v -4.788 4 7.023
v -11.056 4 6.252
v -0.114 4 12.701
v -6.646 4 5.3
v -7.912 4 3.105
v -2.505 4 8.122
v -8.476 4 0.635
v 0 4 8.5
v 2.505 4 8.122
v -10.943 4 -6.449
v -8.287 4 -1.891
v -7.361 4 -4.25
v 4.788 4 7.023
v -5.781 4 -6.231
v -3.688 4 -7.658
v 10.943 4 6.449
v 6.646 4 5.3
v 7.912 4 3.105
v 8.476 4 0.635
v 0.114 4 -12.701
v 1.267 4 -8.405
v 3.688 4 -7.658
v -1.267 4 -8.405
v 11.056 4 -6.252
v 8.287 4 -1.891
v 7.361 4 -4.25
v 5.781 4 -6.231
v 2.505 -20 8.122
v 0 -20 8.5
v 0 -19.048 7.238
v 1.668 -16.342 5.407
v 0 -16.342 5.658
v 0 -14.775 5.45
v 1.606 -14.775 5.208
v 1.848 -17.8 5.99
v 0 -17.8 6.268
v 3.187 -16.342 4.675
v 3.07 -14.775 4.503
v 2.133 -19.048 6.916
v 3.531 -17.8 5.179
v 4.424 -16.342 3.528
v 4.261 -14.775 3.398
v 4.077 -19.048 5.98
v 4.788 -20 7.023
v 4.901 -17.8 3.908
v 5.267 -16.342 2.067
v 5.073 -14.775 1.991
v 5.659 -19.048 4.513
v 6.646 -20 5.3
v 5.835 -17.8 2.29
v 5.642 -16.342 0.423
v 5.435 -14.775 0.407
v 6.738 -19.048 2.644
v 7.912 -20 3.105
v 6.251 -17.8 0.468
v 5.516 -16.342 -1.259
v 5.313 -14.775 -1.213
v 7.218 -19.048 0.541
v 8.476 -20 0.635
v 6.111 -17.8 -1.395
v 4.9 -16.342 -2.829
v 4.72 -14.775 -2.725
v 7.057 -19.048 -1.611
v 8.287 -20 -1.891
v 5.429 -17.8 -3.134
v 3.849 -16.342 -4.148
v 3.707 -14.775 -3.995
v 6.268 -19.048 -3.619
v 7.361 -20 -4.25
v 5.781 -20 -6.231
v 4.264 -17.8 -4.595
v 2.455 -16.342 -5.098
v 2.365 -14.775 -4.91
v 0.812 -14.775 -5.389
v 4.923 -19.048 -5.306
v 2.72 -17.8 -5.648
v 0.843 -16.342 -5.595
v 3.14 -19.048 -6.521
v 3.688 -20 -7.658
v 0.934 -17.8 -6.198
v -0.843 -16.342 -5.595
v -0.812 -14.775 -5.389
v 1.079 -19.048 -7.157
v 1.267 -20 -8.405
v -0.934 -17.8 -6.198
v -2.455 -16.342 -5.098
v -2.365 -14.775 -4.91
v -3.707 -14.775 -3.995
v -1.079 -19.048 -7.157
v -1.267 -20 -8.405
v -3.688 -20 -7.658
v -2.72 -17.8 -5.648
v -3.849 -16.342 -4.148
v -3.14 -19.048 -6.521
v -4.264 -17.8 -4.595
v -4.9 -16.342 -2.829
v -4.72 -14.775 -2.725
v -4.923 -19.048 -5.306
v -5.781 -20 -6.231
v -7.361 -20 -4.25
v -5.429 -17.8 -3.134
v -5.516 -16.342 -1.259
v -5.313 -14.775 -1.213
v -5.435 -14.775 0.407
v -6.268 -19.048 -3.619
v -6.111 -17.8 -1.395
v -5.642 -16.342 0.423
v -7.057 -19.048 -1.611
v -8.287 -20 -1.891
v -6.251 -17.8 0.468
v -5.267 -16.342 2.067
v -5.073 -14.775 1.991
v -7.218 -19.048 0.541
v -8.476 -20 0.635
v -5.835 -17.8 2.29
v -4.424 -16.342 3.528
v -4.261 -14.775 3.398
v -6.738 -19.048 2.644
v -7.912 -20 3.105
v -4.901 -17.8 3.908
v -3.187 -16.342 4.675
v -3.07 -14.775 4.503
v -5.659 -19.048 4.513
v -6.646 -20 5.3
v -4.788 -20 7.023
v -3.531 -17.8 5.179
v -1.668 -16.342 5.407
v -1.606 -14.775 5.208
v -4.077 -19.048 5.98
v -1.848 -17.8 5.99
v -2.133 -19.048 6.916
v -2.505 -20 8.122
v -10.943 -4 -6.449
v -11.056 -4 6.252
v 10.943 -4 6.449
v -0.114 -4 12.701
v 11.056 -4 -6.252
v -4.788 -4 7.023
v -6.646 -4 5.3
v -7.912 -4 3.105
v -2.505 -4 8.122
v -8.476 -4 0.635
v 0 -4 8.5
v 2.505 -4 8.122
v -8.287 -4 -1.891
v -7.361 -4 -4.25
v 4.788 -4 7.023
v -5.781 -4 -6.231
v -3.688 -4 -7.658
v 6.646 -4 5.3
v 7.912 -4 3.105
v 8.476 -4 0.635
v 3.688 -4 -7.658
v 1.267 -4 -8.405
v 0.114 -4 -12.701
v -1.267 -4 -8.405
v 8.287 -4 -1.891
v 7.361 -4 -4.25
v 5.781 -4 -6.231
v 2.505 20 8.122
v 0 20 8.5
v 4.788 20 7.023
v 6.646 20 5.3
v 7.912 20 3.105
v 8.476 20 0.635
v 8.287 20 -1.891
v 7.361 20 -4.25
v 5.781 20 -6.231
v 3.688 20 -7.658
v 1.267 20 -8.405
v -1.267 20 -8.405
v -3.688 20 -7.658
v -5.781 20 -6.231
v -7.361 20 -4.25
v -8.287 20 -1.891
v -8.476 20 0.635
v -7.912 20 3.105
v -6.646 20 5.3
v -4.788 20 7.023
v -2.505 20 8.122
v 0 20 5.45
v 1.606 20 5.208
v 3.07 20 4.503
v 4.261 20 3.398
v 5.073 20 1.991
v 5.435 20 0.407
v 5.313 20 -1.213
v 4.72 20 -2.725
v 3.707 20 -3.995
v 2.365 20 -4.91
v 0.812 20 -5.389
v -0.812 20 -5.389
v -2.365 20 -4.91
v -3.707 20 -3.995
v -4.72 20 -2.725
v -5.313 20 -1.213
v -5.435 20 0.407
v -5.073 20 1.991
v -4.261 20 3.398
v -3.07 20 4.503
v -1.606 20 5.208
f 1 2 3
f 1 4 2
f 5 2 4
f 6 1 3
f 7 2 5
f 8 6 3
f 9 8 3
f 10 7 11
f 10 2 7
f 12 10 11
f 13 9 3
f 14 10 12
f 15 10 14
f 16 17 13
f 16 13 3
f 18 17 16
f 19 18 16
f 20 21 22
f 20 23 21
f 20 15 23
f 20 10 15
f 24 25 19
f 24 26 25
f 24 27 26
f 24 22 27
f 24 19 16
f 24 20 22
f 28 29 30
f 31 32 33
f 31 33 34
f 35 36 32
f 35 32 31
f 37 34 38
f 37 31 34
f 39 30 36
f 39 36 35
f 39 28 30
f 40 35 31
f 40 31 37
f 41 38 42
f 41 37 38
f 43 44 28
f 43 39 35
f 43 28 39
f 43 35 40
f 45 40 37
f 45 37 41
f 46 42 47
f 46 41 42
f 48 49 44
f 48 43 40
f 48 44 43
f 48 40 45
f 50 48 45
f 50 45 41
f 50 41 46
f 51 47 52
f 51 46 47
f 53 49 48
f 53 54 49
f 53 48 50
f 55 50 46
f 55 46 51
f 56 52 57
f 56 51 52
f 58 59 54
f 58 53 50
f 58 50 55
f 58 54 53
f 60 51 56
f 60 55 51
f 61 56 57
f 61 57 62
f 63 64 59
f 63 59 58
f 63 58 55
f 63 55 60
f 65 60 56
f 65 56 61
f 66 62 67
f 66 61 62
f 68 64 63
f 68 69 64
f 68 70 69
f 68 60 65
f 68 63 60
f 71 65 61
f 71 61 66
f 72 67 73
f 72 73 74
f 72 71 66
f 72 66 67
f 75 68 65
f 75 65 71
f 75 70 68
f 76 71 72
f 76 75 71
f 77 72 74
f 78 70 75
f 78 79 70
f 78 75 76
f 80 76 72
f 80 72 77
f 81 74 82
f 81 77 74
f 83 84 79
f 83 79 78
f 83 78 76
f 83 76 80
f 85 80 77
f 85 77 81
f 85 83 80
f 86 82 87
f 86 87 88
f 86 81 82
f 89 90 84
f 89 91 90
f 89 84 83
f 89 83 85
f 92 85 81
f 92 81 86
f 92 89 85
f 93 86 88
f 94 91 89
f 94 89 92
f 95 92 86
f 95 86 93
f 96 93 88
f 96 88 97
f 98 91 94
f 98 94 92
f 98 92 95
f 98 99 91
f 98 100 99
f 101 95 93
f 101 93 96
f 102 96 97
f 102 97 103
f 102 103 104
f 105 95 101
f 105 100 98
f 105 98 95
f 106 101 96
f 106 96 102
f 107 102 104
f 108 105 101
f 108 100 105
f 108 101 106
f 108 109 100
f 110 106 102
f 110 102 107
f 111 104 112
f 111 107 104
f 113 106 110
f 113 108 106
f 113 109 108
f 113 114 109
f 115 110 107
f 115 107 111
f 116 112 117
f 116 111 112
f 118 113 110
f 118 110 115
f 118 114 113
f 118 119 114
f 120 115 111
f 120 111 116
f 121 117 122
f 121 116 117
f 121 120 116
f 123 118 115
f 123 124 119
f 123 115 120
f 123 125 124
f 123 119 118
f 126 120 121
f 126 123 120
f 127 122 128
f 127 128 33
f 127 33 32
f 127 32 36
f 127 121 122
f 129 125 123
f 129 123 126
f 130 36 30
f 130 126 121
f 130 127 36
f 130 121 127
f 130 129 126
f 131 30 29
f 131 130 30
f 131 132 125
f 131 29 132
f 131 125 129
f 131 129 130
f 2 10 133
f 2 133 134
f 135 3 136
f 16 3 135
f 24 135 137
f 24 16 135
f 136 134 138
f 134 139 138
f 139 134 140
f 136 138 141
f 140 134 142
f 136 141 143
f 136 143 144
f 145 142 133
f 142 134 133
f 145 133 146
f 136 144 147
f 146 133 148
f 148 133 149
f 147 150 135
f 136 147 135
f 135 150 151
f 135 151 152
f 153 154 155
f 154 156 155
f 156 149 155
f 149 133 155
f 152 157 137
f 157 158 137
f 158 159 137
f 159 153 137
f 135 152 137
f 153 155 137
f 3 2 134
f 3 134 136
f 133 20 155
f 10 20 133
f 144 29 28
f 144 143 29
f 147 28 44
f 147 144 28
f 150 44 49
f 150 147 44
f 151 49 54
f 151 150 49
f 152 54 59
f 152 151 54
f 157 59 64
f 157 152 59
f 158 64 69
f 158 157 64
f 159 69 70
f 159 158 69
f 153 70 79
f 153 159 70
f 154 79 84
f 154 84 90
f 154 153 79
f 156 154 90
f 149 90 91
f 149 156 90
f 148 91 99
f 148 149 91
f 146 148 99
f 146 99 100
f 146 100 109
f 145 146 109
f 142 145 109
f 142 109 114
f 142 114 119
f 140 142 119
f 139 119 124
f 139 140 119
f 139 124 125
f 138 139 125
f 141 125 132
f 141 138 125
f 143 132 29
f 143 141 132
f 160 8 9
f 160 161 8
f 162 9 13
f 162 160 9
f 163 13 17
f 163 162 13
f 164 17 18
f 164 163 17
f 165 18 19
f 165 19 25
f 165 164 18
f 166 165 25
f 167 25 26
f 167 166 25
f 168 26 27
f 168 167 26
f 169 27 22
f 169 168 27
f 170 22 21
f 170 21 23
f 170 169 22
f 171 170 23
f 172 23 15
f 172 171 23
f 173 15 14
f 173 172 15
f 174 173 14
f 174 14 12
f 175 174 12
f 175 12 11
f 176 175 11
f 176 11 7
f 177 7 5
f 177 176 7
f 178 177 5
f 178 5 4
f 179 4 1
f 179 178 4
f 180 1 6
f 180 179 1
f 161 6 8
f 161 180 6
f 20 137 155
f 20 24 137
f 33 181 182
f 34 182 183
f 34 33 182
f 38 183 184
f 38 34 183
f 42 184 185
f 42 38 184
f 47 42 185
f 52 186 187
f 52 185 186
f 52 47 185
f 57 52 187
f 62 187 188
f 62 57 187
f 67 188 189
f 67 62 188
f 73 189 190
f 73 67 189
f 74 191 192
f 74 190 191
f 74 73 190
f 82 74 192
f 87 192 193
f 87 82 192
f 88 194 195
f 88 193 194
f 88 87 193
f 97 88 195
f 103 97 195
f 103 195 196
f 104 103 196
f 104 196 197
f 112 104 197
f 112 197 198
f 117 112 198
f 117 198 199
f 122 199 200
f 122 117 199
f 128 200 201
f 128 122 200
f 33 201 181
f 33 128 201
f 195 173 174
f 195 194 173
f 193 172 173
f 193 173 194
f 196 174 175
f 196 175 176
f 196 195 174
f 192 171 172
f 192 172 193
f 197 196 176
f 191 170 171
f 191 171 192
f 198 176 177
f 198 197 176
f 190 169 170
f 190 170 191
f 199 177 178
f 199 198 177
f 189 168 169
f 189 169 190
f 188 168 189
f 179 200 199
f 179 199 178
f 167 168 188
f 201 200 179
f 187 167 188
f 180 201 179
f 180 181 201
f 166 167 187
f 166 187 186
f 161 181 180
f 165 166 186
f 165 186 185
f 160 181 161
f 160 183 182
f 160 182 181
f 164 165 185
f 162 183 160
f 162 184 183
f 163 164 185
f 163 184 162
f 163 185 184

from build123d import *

# Parameters (mm, degrees)
SKETCH1_R               = 8.5
BOSS_EXTRUDE1_DEPTH     = 20
BOSS_EXTRUDE2_DEPTH     = 4
CUT_EXTRUDE1_DEPTH      = 44.400071981
CUT_EXTRUDE1_DEPTH_BACK = 44.400071981
SKETCH3_R               = 5.45
FILLET1_R               = 6


with BuildPart() as part:
    # Sketch1 → Boss-Extrude1 (new, symmetric)
    with BuildSketch(Plane(origin=(0, 0, 0), x_dir=(1, 0, 0), z_dir=(0, 1, 0))):
        with Locations(Location((0, 0, 0), (0, 0, 270))):
            Circle(SKETCH1_R)
    extrude(amount=BOSS_EXTRUDE1_DEPTH, both=True)

    # Sketch2 → Boss-Extrude2 (add, symmetric)
    with BuildSketch(Plane(origin=(0, 0, 0), x_dir=(1, 0, 0), z_dir=(0, 1, 0))):
        Polygon((11.056485774, 6.251996134), (0.113855411, 12.701195624), (-10.942630364, 6.44919949), (-11.056485774, -6.251996134), (-0.113855411, -12.701195624), (10.942630364, -6.44919949), align=None)
    extrude(amount=BOSS_EXTRUDE2_DEPTH, both=True)

    # Sketch3 → Cut-Extrude1 (cut, two sides: drawn at the far end of the back side and taken through both)
    with BuildSketch(Plane(origin=(0, 20, 0), x_dir=(1, 0, 0), z_dir=(0, 1, 0)).offset(-CUT_EXTRUDE1_DEPTH_BACK)):
        with Locations(Location((0, 0, 0), (0, 0, 270))):
            Circle(SKETCH3_R)
    extrude(amount=CUT_EXTRUDE1_DEPTH + CUT_EXTRUDE1_DEPTH_BACK, mode=Mode.SUBTRACT)

    # Fillet1
    # the kernel refuses this fillet: 6 mm, written as the material it takes off along each edge
    with BuildSketch(Plane(origin=(0, -20, 0), x_dir=(0, 0, 1), z_dir=(-1, 0, 0))) as fillet1_piece_1:
        with BuildLine():
            CenterArc((11.45, 5.224700948), FILLET1_R, 180, 60.549814279)
            Line((5.45, 5.224700948), (5.33, 5.224700948))
            Line((5.33, 5.224700948), (5.33, 0))
            Line((5.33, 0), (5.45, -0.12))
            ThreePointArc((5.45, -0.12), (6.975, -0.12), (8.441, -0.104494019))
            Line((8.441, -0.104494019), (8.5, 0))
        make_face()
    revolve(axis=Axis((0, -20, 0), (0, 1, 0)), mode=Mode.SUBTRACT)


solid = part.part
